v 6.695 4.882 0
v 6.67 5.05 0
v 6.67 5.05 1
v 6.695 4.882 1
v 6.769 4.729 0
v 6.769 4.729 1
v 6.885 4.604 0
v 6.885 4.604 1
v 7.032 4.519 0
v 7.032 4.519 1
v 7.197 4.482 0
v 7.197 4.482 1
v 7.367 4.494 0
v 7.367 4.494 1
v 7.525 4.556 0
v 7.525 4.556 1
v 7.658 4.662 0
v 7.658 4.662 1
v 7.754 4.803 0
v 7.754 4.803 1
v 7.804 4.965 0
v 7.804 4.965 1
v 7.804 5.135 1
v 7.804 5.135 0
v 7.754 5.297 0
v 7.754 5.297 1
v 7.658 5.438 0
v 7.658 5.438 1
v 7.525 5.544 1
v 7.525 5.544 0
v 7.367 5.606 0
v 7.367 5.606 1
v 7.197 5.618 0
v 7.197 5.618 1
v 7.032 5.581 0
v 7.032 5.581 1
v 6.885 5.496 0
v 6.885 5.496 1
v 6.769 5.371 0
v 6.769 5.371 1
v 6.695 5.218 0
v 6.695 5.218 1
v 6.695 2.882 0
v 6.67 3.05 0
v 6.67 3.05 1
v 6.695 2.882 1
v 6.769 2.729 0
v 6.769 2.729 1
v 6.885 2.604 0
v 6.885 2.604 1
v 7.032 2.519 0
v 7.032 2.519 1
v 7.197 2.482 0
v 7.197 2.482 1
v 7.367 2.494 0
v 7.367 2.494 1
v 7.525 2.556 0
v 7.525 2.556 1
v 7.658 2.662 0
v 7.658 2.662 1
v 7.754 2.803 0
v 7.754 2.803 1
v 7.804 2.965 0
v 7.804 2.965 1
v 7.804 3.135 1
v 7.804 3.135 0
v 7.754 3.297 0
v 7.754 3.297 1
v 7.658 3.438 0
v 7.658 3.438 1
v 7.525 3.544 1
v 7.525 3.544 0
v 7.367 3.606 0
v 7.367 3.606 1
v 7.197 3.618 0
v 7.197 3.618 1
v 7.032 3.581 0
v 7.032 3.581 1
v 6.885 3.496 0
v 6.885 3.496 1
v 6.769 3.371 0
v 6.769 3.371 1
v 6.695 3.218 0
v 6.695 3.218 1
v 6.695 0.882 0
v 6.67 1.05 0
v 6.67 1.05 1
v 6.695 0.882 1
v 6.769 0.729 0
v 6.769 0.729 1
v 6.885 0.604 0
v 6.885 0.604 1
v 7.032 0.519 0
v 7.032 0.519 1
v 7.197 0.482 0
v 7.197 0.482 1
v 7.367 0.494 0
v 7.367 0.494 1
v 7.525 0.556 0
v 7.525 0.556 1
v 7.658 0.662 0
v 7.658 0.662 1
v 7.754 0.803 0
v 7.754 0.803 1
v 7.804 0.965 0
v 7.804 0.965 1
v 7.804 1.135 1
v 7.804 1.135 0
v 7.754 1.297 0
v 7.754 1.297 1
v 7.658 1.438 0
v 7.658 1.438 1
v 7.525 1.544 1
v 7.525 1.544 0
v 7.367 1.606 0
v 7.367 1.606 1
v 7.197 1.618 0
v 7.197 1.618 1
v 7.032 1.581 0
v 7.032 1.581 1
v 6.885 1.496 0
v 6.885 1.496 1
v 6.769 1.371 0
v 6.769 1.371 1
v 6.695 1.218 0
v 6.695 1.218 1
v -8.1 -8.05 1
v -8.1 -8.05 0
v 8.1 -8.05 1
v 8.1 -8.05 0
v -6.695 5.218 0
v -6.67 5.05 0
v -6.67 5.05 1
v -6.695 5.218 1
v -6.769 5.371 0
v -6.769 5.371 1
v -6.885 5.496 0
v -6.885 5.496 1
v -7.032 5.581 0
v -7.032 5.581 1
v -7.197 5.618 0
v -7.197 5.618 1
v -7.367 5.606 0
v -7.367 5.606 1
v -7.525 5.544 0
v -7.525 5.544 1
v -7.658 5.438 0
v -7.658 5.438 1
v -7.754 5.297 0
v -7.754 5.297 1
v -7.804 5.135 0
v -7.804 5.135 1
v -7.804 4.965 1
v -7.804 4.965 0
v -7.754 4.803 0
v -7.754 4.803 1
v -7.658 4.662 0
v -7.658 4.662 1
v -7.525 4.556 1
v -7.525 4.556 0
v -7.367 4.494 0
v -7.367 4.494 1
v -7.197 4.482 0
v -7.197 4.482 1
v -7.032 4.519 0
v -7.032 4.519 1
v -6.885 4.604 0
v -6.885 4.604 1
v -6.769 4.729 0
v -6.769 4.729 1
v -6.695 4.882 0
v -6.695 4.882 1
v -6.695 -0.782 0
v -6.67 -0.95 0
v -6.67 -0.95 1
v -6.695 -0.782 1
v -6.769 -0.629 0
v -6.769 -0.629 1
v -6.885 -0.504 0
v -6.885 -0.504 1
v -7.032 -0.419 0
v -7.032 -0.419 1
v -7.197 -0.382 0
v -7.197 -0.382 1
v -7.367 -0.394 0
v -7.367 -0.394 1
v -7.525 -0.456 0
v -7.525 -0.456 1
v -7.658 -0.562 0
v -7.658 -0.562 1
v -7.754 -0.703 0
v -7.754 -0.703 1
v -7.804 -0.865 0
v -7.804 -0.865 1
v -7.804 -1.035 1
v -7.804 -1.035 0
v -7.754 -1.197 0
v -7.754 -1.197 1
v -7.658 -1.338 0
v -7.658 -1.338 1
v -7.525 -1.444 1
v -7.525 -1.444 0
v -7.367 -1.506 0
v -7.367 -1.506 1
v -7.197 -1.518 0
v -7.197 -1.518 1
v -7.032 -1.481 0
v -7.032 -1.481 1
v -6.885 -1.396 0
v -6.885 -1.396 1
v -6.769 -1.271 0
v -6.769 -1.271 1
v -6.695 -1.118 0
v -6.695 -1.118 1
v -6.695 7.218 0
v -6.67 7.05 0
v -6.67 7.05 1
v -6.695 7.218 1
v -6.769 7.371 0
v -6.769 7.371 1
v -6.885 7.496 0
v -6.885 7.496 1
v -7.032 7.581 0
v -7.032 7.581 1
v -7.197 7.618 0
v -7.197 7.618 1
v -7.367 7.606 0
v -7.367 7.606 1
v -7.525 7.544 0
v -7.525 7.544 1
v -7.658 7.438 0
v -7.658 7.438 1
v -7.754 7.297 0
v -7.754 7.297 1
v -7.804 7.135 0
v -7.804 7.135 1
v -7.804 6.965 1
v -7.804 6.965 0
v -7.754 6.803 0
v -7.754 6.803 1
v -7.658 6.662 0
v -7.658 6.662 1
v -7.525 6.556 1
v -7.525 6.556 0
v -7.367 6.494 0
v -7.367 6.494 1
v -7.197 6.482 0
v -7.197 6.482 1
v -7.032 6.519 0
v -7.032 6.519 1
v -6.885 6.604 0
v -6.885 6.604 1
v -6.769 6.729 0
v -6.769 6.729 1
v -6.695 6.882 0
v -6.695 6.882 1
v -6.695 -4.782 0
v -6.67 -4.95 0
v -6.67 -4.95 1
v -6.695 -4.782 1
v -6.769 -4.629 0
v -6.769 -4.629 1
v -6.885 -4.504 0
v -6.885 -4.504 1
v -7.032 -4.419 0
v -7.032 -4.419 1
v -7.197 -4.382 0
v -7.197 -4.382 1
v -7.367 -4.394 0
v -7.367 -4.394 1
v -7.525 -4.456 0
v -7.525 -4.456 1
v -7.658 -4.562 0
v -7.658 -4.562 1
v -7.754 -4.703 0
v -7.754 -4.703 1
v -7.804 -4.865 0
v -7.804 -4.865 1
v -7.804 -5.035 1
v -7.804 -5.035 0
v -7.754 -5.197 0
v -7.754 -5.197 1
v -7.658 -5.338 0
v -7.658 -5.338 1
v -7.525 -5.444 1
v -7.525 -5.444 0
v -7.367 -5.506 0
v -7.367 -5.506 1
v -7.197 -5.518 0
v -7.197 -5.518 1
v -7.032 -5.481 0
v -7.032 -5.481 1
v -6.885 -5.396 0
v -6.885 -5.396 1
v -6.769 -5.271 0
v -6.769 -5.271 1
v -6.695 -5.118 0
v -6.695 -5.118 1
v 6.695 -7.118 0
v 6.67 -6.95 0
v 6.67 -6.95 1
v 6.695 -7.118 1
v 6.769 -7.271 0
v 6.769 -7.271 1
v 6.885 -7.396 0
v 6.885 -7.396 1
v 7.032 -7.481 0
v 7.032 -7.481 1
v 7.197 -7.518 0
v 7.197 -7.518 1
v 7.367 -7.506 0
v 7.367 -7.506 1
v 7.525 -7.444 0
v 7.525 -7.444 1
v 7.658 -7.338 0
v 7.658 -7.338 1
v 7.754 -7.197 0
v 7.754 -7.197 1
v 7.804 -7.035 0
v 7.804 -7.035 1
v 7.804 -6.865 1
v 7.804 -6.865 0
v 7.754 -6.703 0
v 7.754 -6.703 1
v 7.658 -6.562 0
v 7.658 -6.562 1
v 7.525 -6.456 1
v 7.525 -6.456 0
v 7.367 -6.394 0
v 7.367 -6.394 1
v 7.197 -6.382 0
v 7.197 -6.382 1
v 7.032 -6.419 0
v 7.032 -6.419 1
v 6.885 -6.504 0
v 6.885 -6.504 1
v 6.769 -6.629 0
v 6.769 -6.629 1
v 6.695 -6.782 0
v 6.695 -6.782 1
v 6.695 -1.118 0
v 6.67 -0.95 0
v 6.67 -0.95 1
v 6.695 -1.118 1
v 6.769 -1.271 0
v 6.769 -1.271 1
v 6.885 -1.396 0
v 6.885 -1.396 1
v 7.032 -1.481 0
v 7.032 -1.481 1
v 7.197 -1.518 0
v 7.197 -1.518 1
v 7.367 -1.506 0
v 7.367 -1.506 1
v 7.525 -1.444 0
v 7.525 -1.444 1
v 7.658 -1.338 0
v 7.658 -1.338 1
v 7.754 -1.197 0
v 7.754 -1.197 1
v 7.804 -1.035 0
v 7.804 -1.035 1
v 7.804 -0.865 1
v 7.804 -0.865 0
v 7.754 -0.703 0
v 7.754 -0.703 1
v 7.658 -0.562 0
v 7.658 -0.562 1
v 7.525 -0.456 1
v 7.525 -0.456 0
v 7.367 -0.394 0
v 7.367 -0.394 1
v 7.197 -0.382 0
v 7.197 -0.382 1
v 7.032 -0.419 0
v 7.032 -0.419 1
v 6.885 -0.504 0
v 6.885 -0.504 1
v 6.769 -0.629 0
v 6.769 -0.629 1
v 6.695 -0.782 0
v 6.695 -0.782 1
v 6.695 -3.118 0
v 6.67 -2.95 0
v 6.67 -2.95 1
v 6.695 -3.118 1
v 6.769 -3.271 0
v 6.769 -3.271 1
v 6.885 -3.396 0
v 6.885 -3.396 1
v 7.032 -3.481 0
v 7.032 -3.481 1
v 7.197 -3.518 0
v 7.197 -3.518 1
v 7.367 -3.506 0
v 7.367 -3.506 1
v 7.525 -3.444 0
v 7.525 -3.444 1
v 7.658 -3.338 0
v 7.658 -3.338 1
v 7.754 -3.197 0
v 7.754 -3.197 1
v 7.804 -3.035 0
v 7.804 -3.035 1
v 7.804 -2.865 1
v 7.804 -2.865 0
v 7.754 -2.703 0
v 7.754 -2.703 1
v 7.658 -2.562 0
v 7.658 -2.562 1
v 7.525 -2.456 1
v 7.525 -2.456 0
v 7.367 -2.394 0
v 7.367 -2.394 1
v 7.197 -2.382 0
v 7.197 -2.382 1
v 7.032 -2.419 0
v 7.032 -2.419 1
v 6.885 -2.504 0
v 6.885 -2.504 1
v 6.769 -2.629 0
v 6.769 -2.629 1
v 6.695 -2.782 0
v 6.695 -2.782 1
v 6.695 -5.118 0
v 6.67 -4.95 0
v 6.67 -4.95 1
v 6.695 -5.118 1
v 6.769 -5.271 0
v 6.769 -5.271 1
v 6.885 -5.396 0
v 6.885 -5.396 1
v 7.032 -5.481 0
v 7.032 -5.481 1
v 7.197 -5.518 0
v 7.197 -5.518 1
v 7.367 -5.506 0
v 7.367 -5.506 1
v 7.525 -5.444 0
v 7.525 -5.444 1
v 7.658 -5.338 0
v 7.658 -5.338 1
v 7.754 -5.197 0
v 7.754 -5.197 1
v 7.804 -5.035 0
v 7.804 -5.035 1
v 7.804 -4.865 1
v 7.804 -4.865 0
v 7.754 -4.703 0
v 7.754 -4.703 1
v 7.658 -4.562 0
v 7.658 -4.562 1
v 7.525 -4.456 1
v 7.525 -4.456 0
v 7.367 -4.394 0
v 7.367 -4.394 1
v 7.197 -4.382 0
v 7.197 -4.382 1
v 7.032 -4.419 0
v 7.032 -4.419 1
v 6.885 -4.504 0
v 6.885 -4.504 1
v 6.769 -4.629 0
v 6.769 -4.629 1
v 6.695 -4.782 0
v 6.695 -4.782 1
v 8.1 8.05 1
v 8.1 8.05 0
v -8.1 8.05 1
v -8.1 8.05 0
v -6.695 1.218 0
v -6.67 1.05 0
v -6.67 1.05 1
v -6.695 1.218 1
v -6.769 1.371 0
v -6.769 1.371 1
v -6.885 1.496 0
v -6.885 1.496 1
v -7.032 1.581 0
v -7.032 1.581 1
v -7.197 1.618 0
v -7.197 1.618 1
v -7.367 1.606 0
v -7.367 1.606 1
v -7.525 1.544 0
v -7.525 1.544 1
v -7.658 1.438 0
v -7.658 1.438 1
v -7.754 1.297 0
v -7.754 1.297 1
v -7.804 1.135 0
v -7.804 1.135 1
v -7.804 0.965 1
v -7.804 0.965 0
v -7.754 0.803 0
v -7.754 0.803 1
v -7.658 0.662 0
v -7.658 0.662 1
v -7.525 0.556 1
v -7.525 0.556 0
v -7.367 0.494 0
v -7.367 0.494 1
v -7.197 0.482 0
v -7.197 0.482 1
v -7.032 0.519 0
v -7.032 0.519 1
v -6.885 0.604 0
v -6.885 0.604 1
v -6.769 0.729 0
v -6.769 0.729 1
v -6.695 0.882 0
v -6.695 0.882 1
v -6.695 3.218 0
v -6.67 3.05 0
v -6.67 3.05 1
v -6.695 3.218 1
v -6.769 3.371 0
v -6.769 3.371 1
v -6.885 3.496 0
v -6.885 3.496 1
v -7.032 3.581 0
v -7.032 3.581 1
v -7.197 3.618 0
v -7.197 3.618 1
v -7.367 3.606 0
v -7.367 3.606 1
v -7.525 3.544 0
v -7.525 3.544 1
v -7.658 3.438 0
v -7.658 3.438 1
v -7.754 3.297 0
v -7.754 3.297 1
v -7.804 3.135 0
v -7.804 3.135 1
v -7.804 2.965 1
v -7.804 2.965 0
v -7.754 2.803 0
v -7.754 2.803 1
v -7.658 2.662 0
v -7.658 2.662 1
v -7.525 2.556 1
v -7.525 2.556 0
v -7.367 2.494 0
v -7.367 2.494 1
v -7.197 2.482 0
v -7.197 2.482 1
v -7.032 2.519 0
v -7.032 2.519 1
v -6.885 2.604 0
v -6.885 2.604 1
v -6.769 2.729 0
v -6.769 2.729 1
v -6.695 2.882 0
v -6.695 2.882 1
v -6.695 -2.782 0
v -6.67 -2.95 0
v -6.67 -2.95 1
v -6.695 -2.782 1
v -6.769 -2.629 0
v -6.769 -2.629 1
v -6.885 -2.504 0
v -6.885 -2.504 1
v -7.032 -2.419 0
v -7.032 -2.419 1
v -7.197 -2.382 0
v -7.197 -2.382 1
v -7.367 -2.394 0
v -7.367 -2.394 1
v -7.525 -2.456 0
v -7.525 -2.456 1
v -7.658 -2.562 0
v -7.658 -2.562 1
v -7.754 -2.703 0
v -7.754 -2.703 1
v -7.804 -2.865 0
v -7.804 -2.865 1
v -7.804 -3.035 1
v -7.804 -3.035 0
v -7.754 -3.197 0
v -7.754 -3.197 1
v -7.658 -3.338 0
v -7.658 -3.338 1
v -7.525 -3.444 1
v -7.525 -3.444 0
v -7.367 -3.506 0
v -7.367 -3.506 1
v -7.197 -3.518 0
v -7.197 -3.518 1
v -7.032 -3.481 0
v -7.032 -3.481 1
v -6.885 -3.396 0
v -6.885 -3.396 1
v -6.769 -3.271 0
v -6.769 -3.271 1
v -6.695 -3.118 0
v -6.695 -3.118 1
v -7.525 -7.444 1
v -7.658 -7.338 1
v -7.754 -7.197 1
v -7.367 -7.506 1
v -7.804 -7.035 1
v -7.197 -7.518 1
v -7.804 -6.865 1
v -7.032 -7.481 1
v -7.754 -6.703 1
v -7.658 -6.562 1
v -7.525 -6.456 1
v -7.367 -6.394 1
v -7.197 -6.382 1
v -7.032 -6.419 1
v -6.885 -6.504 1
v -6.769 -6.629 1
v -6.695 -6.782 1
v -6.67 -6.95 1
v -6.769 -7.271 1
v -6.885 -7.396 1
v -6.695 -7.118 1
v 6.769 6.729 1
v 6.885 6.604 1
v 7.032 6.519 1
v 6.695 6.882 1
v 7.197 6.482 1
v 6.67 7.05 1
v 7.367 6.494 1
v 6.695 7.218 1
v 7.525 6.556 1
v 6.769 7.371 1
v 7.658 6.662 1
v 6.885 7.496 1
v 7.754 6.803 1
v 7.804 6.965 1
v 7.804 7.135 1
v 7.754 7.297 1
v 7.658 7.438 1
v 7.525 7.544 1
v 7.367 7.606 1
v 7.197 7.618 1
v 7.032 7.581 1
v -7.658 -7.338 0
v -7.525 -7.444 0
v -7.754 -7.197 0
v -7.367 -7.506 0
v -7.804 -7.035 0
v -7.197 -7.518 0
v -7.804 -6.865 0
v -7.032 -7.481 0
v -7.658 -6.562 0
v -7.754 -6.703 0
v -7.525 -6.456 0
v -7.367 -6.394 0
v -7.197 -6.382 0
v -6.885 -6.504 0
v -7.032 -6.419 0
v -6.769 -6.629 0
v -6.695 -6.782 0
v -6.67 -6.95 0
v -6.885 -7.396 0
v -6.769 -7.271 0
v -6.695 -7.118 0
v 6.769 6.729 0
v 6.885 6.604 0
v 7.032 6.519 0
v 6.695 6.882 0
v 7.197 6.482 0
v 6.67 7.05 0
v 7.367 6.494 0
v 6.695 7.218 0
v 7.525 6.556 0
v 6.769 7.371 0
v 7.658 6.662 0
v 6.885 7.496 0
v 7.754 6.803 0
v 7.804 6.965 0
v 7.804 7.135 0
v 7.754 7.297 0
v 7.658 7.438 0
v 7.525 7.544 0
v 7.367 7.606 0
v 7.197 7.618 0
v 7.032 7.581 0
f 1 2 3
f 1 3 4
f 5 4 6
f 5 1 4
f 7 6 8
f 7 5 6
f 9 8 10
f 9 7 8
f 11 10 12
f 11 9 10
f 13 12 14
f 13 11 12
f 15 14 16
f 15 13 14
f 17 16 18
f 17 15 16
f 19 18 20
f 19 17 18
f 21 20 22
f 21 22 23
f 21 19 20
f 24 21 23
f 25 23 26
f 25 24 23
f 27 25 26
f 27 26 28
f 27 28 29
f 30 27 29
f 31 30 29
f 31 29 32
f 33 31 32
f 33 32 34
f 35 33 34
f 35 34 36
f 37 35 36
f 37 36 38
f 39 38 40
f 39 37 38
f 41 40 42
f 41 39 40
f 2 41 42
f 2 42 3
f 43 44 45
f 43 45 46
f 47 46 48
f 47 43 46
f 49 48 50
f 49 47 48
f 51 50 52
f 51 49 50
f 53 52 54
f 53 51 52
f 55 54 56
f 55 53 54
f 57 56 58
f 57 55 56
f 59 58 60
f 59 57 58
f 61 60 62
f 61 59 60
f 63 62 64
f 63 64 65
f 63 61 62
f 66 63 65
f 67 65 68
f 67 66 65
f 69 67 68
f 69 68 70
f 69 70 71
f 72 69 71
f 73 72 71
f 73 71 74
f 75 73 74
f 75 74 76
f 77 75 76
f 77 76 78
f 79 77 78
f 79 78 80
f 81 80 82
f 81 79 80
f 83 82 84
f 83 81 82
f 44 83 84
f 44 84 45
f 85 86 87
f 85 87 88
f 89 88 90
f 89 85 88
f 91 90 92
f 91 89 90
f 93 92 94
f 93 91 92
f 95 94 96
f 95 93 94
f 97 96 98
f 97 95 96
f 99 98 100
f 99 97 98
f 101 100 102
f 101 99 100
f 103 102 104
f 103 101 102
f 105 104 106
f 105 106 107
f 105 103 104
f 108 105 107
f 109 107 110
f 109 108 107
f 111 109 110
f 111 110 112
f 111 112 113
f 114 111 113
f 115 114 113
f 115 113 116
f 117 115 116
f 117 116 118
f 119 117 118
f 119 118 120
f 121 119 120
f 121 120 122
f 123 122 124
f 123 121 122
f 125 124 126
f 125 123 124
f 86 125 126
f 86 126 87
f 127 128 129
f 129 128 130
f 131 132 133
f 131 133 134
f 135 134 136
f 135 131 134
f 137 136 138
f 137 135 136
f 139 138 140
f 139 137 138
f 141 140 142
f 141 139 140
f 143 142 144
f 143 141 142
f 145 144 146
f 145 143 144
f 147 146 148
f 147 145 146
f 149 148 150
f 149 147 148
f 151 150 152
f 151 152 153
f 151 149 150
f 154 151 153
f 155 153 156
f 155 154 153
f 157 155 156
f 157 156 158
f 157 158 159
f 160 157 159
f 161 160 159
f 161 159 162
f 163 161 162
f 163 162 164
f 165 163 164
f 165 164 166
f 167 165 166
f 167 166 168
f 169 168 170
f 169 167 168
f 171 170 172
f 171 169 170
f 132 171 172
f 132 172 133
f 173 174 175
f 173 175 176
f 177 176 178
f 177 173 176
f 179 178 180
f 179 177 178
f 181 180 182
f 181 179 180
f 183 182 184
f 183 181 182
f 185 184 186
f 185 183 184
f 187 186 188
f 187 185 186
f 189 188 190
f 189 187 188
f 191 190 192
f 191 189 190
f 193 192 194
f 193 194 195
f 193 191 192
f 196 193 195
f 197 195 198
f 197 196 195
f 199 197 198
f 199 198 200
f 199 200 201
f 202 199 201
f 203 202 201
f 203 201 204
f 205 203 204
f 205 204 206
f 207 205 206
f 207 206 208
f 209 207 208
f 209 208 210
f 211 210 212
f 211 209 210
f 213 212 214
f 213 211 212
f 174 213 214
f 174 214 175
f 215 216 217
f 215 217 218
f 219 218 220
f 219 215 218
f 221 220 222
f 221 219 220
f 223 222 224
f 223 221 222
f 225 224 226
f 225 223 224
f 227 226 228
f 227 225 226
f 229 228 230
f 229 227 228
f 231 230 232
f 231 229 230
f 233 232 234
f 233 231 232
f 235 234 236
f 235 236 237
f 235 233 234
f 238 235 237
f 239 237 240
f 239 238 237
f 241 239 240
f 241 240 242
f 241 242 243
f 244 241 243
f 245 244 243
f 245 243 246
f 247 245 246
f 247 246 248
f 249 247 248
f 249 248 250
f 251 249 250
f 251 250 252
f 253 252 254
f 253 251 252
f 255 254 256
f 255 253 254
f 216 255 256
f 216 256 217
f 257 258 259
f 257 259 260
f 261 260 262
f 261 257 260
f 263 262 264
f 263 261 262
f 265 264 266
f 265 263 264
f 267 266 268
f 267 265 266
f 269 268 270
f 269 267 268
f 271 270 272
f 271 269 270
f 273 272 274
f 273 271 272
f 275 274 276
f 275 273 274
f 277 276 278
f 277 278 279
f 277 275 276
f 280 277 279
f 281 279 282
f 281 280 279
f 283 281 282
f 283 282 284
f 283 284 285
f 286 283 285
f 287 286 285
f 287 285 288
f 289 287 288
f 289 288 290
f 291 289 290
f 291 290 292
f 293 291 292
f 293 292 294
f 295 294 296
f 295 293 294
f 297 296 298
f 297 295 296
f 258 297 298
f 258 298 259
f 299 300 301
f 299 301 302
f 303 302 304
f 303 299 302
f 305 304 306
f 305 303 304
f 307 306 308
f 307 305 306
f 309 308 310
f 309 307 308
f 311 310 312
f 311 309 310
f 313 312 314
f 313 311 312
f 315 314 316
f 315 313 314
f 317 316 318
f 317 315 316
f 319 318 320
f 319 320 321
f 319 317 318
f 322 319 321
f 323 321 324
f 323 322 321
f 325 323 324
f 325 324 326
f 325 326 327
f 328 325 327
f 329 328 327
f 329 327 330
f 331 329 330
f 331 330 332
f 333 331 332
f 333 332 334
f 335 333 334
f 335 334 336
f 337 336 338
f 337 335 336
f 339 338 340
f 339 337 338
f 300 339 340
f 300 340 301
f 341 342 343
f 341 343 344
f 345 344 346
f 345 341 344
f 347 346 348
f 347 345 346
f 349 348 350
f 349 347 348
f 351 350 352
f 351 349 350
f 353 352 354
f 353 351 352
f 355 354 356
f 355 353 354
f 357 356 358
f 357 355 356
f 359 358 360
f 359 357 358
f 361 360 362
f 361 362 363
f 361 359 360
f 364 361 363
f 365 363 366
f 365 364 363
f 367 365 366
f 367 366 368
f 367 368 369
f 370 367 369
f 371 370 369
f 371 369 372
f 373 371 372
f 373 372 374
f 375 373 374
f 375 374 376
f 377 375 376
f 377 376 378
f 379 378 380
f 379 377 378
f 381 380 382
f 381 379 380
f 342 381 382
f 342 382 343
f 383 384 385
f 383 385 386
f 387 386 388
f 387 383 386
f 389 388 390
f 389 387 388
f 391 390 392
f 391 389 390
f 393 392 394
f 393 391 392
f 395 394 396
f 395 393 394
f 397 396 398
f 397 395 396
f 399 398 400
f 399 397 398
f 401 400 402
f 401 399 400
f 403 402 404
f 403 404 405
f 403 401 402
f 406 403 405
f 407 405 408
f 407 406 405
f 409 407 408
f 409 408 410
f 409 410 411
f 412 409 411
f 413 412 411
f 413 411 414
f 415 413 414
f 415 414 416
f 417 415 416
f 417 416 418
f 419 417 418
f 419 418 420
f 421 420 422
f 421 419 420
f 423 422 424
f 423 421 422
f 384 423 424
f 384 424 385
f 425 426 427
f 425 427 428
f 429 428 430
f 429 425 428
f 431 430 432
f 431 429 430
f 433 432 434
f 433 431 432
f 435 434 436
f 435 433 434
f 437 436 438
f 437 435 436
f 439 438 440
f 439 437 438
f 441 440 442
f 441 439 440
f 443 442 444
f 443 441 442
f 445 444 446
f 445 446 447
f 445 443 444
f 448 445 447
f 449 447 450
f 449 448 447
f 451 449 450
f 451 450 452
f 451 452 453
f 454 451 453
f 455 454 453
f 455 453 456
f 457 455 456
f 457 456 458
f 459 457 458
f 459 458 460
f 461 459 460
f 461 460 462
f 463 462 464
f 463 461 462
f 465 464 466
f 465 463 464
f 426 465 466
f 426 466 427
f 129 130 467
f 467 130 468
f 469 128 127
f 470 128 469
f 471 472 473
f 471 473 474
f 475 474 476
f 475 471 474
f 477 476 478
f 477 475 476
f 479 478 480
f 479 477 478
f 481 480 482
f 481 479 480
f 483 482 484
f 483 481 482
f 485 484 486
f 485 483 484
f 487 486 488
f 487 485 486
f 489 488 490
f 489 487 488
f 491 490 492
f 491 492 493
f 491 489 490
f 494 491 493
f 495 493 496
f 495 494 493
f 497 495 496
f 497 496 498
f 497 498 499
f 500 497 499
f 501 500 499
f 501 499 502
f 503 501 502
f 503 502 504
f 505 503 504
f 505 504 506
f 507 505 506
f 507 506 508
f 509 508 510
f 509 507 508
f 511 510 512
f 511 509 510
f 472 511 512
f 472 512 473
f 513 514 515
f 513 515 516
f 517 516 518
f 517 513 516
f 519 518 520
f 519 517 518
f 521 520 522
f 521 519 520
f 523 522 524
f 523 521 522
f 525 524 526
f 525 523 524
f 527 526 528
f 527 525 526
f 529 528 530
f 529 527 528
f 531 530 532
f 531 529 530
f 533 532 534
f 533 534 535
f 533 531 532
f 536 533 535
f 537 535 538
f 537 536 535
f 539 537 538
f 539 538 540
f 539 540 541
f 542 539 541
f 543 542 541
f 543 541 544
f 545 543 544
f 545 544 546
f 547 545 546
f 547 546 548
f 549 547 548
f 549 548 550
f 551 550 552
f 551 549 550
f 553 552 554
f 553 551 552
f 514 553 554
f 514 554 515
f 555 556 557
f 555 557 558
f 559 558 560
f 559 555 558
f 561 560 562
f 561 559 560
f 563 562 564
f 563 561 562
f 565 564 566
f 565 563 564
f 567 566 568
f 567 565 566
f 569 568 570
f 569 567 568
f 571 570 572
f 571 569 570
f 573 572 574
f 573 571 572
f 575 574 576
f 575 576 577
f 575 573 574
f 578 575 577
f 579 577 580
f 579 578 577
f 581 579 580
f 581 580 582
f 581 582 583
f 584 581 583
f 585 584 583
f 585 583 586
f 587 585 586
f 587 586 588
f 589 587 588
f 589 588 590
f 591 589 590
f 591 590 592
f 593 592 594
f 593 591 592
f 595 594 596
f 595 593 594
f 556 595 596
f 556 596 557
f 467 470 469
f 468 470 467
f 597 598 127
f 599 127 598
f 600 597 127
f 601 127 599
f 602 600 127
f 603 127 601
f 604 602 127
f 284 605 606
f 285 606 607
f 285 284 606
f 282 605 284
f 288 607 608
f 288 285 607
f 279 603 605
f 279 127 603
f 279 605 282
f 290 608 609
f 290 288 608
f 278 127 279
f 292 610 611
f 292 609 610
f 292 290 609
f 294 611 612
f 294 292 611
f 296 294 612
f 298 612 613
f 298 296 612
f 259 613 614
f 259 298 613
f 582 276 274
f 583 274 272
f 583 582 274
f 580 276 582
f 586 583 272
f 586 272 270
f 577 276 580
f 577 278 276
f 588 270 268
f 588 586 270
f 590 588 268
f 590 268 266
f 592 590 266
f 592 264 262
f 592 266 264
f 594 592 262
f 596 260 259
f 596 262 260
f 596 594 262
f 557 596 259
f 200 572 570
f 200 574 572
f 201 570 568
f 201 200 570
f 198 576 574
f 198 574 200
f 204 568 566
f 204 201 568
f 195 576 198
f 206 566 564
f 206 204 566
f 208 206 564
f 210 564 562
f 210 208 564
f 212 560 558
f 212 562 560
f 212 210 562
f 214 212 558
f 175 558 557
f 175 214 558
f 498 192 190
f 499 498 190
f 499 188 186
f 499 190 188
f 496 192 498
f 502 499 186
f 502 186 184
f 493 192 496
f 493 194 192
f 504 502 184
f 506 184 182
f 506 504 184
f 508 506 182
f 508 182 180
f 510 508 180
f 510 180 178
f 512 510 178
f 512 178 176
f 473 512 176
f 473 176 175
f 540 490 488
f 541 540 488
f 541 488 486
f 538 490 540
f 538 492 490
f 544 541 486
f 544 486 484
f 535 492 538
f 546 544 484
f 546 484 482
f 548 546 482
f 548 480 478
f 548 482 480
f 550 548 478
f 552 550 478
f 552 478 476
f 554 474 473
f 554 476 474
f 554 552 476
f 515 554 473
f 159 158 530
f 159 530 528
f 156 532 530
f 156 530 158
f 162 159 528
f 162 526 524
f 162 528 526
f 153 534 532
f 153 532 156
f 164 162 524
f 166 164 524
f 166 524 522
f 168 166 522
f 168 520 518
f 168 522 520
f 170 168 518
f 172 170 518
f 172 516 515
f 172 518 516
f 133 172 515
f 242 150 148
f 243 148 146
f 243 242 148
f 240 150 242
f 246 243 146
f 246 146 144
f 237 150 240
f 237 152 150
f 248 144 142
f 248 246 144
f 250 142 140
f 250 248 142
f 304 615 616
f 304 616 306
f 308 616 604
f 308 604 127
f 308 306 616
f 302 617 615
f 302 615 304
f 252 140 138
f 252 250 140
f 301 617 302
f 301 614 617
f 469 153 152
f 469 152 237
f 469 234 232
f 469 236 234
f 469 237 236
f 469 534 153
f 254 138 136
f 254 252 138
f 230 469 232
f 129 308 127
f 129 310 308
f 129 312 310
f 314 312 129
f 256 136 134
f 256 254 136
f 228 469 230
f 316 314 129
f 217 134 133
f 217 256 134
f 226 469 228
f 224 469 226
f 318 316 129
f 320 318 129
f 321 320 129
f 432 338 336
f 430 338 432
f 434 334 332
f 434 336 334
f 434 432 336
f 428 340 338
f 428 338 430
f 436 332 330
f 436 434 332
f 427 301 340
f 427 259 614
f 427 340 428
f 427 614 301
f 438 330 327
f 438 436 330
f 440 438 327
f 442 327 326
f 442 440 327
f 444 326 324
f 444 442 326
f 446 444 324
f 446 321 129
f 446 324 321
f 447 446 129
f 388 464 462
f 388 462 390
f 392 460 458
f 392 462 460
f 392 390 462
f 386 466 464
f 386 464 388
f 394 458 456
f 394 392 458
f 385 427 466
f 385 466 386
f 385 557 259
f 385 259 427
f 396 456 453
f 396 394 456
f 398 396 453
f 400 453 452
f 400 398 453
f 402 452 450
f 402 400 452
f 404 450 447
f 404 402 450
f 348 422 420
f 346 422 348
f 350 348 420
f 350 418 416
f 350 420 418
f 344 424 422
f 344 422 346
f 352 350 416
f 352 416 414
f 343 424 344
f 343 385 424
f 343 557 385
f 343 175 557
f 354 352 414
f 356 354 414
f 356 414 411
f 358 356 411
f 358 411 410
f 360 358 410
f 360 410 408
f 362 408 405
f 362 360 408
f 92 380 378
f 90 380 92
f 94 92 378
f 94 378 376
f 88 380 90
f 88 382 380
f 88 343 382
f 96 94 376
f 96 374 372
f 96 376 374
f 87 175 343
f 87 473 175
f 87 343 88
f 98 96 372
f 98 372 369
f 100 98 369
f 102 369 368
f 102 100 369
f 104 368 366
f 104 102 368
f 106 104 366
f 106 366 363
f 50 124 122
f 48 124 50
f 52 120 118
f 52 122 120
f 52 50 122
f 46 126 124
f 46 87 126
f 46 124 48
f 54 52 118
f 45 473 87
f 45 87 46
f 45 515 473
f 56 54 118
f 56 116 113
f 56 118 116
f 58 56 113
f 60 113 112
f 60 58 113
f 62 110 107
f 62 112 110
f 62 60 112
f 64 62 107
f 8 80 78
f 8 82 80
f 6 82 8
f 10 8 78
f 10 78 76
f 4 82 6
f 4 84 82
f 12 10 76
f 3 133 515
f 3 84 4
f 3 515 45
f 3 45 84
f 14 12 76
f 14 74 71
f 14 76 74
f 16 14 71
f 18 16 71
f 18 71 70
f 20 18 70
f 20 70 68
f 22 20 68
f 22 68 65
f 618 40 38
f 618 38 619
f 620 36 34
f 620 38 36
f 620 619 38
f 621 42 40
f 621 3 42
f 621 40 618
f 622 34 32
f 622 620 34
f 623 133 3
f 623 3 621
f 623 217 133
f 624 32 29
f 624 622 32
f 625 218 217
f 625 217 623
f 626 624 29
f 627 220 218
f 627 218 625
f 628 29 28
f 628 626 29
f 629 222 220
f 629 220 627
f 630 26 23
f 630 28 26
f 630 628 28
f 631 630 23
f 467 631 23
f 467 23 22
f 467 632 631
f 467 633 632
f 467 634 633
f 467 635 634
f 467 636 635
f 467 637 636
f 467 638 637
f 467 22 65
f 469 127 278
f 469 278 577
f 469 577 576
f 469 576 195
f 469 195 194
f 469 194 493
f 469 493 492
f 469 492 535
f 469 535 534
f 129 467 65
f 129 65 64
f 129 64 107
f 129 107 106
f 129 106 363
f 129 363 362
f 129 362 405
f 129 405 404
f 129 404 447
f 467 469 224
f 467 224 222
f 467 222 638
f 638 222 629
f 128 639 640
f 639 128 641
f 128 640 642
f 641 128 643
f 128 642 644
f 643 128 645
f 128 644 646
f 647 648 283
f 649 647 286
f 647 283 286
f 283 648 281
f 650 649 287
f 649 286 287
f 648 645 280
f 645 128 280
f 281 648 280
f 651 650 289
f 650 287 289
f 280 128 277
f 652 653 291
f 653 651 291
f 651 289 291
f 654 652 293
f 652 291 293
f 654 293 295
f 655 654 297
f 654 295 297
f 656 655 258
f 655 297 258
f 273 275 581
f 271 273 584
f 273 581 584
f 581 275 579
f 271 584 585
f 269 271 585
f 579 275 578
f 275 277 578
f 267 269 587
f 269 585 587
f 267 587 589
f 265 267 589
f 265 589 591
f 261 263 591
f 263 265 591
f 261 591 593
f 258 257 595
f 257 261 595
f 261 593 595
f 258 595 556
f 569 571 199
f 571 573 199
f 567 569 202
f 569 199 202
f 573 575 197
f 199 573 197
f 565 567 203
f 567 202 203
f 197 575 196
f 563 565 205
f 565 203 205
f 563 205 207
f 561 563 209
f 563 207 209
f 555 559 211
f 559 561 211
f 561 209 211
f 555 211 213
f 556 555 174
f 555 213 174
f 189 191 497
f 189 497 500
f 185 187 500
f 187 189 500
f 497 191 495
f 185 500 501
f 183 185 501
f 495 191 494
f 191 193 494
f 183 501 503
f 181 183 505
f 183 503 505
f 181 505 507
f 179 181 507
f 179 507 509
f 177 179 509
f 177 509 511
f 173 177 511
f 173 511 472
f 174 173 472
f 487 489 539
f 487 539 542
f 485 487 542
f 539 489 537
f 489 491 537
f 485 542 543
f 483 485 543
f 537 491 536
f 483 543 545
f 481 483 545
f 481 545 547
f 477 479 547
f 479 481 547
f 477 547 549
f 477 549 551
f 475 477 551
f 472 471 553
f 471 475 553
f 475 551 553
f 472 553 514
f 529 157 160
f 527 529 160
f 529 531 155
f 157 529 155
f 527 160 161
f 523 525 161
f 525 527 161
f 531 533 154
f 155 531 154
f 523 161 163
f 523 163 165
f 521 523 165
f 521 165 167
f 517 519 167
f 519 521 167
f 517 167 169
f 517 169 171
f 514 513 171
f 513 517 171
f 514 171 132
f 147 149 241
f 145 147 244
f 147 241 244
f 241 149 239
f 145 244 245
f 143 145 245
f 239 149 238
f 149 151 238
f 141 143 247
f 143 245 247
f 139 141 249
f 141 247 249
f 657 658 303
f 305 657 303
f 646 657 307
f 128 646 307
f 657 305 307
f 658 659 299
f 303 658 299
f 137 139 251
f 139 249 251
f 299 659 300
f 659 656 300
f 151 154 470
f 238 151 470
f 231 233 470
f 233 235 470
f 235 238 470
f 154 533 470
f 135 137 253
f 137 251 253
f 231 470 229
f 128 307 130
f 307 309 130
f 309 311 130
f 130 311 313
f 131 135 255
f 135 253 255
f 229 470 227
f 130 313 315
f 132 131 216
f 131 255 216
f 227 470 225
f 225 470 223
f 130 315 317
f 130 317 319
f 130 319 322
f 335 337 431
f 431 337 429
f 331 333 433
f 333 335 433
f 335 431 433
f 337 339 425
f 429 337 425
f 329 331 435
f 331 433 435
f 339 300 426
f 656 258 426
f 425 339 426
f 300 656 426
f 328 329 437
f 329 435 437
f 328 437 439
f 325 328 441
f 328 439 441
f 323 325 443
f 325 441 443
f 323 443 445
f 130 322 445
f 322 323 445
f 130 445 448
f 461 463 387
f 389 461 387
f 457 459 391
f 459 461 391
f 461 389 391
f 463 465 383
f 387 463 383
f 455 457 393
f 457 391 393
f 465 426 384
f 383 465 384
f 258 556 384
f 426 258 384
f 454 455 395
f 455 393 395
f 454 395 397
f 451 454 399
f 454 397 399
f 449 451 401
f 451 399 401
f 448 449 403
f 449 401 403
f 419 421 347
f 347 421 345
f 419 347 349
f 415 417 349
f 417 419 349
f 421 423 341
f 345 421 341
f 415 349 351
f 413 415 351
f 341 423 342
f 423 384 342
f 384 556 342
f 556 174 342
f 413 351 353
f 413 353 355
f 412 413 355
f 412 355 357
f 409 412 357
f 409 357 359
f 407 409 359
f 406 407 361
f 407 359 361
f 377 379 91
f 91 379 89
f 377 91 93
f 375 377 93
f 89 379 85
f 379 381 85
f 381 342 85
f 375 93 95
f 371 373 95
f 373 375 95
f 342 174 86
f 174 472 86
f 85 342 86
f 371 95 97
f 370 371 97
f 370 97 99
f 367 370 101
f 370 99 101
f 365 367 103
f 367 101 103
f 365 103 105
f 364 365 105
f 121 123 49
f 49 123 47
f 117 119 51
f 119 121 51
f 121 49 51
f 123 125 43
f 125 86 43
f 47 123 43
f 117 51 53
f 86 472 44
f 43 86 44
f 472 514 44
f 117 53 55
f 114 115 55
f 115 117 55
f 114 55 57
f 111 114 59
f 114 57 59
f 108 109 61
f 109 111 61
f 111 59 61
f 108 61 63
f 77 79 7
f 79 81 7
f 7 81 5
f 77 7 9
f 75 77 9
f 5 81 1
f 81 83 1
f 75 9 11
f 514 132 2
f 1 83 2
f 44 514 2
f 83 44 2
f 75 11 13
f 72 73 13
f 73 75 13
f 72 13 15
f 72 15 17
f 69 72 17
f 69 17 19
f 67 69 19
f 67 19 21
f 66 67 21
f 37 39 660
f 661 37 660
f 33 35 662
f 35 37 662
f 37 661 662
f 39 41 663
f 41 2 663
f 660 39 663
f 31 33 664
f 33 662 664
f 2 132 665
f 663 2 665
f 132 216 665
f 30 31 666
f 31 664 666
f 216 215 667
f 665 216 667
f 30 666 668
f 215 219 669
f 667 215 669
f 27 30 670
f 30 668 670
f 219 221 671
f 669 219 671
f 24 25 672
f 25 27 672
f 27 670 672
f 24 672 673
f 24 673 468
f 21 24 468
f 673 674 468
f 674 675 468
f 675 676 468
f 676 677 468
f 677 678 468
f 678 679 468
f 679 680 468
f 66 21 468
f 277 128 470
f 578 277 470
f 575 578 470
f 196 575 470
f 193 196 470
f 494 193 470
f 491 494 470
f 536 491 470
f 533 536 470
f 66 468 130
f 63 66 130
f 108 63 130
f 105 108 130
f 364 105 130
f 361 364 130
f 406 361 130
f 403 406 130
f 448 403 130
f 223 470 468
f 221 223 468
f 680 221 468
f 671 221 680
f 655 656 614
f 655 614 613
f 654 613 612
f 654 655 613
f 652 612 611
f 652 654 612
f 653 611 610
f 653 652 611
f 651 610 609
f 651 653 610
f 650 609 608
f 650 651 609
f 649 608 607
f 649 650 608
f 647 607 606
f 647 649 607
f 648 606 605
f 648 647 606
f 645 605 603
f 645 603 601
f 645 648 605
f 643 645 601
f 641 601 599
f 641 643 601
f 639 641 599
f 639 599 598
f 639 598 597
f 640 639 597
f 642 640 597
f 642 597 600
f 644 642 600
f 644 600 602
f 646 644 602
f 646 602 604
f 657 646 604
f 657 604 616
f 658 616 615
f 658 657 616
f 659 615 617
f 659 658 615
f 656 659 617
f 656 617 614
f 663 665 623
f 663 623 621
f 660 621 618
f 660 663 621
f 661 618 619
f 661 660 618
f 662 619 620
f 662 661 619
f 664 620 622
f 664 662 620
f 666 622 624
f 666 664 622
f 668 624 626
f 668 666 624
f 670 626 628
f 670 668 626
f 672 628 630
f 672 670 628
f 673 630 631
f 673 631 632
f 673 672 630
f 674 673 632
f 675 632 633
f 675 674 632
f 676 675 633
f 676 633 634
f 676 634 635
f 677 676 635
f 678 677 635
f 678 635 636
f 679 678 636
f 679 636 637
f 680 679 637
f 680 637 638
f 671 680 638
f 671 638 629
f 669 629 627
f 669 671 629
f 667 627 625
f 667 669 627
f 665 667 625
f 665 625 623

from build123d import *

# Parameters (mm, degrees)
CROQUIS1_W              = 16.2
CROQUIS1_H              = 16.1
CROQUIS1_R              = 0.57
SALIENTE_EXTRUIR1_DEPTH = 1


with BuildPart() as part:
    # Croquis1 → Saliente-Extruir1 (new body)
    with BuildSketch(Plane.XY):
        Rectangle(CROQUIS1_W, CROQUIS1_H)
        with Locations((-7.24, 7.05)):
            Circle(CROQUIS1_R, mode=Mode.SUBTRACT)
        with Locations((-7.24, 5.05)):
            Circle(CROQUIS1_R, mode=Mode.SUBTRACT)
        with Locations((-7.24, 3.05)):
            Circle(CROQUIS1_R, mode=Mode.SUBTRACT)
        with Locations((-7.24, 1.05)):
            Circle(CROQUIS1_R, mode=Mode.SUBTRACT)
        with Locations((-7.24, -0.95)):
            Circle(CROQUIS1_R, mode=Mode.SUBTRACT)
        with Locations((-7.24, -2.95)):
            Circle(CROQUIS1_R, mode=Mode.SUBTRACT)
        with Locations((-7.24, -4.95)):
            Circle(CROQUIS1_R, mode=Mode.SUBTRACT)
        with Locations((-7.24, -6.95)):
            Circle(CROQUIS1_R, mode=Mode.SUBTRACT)
        with Locations(Location((7.24, -6.95, 0), (0, 0, 180))):
            Circle(CROQUIS1_R, mode=Mode.SUBTRACT)
        with Locations(Location((7.24, -4.95, 0), (0, 0, 180))):
            Circle(CROQUIS1_R, mode=Mode.SUBTRACT)
        with Locations(Location((7.24, -2.95, 0), (0, 0, 180))):
            Circle(CROQUIS1_R, mode=Mode.SUBTRACT)
        with Locations(Location((7.24, -0.95, 0), (0, 0, 180))):
            Circle(CROQUIS1_R, mode=Mode.SUBTRACT)
        with Locations(Location((7.24, 1.05, 0), (0, 0, 180))):
            Circle(CROQUIS1_R, mode=Mode.SUBTRACT)
        with Locations(Location((7.24, 3.05, 0), (0, 0, 180))):
            Circle(CROQUIS1_R, mode=Mode.SUBTRACT)
        with Locations(Location((7.24, 5.05, 0), (0, 0, 180))):
            Circle(CROQUIS1_R, mode=Mode.SUBTRACT)
        with Locations(Location((7.24, 7.05, 0), (0, 0, 180))):
            Circle(CROQUIS1_R, mode=Mode.SUBTRACT)
    extrude(amount=SALIENTE_EXTRUIR1_DEPTH)


solid = part.part
